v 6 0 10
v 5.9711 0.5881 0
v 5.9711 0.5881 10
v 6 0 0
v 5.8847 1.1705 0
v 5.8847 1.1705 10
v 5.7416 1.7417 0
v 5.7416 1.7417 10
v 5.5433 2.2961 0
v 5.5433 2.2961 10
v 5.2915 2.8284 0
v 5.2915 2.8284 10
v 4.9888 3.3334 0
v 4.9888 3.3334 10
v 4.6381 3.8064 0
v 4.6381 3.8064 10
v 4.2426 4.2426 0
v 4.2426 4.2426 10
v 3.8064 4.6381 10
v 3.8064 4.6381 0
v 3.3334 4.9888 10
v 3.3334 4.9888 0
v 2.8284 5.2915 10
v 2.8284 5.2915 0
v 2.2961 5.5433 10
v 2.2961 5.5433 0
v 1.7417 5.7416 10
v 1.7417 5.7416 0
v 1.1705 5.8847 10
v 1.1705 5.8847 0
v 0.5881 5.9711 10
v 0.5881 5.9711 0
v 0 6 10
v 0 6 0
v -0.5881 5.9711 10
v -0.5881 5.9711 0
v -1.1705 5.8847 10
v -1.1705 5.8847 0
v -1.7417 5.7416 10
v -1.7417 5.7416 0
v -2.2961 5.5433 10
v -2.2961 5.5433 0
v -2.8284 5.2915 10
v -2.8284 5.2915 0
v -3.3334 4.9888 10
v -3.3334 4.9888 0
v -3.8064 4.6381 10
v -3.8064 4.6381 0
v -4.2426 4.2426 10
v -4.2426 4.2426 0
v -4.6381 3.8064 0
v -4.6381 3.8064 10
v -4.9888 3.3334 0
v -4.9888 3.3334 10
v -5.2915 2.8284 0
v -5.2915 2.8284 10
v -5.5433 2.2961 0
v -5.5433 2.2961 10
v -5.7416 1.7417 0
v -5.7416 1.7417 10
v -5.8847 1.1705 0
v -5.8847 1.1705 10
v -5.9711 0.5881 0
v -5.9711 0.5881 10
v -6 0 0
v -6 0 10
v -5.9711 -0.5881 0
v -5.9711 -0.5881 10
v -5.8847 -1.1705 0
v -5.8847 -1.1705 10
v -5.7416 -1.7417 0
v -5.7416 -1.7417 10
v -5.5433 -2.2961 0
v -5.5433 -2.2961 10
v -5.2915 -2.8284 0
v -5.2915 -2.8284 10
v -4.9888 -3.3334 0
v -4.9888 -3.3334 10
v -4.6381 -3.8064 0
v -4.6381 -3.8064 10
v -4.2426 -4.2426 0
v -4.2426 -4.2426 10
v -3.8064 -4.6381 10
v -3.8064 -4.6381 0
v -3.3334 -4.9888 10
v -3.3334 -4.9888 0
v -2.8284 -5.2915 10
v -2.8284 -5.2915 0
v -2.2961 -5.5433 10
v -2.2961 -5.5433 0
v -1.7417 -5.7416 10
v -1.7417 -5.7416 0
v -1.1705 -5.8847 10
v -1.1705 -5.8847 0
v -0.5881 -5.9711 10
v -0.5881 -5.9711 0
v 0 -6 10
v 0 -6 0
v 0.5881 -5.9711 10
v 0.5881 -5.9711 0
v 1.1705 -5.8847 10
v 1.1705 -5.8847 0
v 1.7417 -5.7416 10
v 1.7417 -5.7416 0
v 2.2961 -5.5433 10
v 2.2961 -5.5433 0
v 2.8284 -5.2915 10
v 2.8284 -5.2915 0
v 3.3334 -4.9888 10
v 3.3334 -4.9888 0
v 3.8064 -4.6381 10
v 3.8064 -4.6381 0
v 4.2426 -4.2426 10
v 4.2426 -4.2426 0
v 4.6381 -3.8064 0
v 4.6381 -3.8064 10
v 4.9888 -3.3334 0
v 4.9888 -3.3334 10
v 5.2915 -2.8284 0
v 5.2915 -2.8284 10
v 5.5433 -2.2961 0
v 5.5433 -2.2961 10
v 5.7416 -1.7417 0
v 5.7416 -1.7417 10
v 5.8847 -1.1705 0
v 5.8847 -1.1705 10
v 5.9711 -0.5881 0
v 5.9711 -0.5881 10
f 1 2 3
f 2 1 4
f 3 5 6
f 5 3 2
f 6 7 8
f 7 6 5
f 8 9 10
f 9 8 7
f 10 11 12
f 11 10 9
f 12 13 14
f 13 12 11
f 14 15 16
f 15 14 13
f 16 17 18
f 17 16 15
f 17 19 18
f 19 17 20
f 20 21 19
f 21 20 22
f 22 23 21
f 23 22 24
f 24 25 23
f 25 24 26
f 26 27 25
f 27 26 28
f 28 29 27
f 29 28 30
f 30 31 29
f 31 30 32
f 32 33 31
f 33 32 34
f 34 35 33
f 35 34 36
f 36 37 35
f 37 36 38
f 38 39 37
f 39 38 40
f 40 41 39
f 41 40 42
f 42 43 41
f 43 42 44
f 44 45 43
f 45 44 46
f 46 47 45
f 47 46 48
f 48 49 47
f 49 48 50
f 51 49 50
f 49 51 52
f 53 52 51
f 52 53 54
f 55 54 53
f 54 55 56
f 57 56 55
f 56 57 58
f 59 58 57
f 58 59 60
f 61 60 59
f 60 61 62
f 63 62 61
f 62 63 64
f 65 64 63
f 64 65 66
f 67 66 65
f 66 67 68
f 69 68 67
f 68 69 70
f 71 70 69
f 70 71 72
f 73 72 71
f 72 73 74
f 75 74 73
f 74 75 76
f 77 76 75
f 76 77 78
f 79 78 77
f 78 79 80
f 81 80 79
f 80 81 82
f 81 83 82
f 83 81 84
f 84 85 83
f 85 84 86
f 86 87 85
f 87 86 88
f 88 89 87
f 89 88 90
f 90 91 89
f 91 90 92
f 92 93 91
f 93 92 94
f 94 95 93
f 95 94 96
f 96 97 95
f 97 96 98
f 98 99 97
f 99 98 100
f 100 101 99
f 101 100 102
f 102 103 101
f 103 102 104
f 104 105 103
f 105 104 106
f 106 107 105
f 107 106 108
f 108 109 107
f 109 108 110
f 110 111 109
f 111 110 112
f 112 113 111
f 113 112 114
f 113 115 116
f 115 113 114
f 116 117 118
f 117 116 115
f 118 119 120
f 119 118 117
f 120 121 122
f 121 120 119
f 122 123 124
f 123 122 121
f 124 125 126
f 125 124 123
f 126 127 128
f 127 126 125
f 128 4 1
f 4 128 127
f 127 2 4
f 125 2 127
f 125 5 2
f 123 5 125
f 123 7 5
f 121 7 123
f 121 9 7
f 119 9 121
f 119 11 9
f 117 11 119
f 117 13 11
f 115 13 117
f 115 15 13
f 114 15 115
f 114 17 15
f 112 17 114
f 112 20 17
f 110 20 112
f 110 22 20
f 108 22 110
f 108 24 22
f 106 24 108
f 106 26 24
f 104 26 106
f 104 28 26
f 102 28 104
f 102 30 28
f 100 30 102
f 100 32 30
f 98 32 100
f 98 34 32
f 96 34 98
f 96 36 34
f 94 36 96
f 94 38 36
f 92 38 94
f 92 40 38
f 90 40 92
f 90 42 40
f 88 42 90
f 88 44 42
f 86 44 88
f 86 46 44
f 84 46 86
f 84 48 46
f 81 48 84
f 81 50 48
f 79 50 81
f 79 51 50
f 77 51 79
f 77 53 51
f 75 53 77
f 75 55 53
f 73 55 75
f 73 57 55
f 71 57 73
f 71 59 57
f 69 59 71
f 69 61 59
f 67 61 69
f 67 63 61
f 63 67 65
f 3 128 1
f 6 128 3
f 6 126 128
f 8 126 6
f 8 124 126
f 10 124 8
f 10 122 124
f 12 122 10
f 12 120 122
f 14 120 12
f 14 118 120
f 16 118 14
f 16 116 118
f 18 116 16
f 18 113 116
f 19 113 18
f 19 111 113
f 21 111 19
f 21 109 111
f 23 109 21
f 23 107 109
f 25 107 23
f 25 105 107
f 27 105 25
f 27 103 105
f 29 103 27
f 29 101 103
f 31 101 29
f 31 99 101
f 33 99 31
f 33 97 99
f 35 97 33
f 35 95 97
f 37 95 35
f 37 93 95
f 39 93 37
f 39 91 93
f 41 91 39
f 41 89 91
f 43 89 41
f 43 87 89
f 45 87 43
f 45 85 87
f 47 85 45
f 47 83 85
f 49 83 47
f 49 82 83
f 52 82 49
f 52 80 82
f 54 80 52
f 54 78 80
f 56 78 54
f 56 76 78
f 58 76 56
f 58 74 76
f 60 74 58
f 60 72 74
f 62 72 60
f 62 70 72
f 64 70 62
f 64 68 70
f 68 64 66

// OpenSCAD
$fn = 64;
// Wrong height (10 mm instead of 15 mm) and solid cylinder (no bore).
cylinder(h = 10, d = 12);
